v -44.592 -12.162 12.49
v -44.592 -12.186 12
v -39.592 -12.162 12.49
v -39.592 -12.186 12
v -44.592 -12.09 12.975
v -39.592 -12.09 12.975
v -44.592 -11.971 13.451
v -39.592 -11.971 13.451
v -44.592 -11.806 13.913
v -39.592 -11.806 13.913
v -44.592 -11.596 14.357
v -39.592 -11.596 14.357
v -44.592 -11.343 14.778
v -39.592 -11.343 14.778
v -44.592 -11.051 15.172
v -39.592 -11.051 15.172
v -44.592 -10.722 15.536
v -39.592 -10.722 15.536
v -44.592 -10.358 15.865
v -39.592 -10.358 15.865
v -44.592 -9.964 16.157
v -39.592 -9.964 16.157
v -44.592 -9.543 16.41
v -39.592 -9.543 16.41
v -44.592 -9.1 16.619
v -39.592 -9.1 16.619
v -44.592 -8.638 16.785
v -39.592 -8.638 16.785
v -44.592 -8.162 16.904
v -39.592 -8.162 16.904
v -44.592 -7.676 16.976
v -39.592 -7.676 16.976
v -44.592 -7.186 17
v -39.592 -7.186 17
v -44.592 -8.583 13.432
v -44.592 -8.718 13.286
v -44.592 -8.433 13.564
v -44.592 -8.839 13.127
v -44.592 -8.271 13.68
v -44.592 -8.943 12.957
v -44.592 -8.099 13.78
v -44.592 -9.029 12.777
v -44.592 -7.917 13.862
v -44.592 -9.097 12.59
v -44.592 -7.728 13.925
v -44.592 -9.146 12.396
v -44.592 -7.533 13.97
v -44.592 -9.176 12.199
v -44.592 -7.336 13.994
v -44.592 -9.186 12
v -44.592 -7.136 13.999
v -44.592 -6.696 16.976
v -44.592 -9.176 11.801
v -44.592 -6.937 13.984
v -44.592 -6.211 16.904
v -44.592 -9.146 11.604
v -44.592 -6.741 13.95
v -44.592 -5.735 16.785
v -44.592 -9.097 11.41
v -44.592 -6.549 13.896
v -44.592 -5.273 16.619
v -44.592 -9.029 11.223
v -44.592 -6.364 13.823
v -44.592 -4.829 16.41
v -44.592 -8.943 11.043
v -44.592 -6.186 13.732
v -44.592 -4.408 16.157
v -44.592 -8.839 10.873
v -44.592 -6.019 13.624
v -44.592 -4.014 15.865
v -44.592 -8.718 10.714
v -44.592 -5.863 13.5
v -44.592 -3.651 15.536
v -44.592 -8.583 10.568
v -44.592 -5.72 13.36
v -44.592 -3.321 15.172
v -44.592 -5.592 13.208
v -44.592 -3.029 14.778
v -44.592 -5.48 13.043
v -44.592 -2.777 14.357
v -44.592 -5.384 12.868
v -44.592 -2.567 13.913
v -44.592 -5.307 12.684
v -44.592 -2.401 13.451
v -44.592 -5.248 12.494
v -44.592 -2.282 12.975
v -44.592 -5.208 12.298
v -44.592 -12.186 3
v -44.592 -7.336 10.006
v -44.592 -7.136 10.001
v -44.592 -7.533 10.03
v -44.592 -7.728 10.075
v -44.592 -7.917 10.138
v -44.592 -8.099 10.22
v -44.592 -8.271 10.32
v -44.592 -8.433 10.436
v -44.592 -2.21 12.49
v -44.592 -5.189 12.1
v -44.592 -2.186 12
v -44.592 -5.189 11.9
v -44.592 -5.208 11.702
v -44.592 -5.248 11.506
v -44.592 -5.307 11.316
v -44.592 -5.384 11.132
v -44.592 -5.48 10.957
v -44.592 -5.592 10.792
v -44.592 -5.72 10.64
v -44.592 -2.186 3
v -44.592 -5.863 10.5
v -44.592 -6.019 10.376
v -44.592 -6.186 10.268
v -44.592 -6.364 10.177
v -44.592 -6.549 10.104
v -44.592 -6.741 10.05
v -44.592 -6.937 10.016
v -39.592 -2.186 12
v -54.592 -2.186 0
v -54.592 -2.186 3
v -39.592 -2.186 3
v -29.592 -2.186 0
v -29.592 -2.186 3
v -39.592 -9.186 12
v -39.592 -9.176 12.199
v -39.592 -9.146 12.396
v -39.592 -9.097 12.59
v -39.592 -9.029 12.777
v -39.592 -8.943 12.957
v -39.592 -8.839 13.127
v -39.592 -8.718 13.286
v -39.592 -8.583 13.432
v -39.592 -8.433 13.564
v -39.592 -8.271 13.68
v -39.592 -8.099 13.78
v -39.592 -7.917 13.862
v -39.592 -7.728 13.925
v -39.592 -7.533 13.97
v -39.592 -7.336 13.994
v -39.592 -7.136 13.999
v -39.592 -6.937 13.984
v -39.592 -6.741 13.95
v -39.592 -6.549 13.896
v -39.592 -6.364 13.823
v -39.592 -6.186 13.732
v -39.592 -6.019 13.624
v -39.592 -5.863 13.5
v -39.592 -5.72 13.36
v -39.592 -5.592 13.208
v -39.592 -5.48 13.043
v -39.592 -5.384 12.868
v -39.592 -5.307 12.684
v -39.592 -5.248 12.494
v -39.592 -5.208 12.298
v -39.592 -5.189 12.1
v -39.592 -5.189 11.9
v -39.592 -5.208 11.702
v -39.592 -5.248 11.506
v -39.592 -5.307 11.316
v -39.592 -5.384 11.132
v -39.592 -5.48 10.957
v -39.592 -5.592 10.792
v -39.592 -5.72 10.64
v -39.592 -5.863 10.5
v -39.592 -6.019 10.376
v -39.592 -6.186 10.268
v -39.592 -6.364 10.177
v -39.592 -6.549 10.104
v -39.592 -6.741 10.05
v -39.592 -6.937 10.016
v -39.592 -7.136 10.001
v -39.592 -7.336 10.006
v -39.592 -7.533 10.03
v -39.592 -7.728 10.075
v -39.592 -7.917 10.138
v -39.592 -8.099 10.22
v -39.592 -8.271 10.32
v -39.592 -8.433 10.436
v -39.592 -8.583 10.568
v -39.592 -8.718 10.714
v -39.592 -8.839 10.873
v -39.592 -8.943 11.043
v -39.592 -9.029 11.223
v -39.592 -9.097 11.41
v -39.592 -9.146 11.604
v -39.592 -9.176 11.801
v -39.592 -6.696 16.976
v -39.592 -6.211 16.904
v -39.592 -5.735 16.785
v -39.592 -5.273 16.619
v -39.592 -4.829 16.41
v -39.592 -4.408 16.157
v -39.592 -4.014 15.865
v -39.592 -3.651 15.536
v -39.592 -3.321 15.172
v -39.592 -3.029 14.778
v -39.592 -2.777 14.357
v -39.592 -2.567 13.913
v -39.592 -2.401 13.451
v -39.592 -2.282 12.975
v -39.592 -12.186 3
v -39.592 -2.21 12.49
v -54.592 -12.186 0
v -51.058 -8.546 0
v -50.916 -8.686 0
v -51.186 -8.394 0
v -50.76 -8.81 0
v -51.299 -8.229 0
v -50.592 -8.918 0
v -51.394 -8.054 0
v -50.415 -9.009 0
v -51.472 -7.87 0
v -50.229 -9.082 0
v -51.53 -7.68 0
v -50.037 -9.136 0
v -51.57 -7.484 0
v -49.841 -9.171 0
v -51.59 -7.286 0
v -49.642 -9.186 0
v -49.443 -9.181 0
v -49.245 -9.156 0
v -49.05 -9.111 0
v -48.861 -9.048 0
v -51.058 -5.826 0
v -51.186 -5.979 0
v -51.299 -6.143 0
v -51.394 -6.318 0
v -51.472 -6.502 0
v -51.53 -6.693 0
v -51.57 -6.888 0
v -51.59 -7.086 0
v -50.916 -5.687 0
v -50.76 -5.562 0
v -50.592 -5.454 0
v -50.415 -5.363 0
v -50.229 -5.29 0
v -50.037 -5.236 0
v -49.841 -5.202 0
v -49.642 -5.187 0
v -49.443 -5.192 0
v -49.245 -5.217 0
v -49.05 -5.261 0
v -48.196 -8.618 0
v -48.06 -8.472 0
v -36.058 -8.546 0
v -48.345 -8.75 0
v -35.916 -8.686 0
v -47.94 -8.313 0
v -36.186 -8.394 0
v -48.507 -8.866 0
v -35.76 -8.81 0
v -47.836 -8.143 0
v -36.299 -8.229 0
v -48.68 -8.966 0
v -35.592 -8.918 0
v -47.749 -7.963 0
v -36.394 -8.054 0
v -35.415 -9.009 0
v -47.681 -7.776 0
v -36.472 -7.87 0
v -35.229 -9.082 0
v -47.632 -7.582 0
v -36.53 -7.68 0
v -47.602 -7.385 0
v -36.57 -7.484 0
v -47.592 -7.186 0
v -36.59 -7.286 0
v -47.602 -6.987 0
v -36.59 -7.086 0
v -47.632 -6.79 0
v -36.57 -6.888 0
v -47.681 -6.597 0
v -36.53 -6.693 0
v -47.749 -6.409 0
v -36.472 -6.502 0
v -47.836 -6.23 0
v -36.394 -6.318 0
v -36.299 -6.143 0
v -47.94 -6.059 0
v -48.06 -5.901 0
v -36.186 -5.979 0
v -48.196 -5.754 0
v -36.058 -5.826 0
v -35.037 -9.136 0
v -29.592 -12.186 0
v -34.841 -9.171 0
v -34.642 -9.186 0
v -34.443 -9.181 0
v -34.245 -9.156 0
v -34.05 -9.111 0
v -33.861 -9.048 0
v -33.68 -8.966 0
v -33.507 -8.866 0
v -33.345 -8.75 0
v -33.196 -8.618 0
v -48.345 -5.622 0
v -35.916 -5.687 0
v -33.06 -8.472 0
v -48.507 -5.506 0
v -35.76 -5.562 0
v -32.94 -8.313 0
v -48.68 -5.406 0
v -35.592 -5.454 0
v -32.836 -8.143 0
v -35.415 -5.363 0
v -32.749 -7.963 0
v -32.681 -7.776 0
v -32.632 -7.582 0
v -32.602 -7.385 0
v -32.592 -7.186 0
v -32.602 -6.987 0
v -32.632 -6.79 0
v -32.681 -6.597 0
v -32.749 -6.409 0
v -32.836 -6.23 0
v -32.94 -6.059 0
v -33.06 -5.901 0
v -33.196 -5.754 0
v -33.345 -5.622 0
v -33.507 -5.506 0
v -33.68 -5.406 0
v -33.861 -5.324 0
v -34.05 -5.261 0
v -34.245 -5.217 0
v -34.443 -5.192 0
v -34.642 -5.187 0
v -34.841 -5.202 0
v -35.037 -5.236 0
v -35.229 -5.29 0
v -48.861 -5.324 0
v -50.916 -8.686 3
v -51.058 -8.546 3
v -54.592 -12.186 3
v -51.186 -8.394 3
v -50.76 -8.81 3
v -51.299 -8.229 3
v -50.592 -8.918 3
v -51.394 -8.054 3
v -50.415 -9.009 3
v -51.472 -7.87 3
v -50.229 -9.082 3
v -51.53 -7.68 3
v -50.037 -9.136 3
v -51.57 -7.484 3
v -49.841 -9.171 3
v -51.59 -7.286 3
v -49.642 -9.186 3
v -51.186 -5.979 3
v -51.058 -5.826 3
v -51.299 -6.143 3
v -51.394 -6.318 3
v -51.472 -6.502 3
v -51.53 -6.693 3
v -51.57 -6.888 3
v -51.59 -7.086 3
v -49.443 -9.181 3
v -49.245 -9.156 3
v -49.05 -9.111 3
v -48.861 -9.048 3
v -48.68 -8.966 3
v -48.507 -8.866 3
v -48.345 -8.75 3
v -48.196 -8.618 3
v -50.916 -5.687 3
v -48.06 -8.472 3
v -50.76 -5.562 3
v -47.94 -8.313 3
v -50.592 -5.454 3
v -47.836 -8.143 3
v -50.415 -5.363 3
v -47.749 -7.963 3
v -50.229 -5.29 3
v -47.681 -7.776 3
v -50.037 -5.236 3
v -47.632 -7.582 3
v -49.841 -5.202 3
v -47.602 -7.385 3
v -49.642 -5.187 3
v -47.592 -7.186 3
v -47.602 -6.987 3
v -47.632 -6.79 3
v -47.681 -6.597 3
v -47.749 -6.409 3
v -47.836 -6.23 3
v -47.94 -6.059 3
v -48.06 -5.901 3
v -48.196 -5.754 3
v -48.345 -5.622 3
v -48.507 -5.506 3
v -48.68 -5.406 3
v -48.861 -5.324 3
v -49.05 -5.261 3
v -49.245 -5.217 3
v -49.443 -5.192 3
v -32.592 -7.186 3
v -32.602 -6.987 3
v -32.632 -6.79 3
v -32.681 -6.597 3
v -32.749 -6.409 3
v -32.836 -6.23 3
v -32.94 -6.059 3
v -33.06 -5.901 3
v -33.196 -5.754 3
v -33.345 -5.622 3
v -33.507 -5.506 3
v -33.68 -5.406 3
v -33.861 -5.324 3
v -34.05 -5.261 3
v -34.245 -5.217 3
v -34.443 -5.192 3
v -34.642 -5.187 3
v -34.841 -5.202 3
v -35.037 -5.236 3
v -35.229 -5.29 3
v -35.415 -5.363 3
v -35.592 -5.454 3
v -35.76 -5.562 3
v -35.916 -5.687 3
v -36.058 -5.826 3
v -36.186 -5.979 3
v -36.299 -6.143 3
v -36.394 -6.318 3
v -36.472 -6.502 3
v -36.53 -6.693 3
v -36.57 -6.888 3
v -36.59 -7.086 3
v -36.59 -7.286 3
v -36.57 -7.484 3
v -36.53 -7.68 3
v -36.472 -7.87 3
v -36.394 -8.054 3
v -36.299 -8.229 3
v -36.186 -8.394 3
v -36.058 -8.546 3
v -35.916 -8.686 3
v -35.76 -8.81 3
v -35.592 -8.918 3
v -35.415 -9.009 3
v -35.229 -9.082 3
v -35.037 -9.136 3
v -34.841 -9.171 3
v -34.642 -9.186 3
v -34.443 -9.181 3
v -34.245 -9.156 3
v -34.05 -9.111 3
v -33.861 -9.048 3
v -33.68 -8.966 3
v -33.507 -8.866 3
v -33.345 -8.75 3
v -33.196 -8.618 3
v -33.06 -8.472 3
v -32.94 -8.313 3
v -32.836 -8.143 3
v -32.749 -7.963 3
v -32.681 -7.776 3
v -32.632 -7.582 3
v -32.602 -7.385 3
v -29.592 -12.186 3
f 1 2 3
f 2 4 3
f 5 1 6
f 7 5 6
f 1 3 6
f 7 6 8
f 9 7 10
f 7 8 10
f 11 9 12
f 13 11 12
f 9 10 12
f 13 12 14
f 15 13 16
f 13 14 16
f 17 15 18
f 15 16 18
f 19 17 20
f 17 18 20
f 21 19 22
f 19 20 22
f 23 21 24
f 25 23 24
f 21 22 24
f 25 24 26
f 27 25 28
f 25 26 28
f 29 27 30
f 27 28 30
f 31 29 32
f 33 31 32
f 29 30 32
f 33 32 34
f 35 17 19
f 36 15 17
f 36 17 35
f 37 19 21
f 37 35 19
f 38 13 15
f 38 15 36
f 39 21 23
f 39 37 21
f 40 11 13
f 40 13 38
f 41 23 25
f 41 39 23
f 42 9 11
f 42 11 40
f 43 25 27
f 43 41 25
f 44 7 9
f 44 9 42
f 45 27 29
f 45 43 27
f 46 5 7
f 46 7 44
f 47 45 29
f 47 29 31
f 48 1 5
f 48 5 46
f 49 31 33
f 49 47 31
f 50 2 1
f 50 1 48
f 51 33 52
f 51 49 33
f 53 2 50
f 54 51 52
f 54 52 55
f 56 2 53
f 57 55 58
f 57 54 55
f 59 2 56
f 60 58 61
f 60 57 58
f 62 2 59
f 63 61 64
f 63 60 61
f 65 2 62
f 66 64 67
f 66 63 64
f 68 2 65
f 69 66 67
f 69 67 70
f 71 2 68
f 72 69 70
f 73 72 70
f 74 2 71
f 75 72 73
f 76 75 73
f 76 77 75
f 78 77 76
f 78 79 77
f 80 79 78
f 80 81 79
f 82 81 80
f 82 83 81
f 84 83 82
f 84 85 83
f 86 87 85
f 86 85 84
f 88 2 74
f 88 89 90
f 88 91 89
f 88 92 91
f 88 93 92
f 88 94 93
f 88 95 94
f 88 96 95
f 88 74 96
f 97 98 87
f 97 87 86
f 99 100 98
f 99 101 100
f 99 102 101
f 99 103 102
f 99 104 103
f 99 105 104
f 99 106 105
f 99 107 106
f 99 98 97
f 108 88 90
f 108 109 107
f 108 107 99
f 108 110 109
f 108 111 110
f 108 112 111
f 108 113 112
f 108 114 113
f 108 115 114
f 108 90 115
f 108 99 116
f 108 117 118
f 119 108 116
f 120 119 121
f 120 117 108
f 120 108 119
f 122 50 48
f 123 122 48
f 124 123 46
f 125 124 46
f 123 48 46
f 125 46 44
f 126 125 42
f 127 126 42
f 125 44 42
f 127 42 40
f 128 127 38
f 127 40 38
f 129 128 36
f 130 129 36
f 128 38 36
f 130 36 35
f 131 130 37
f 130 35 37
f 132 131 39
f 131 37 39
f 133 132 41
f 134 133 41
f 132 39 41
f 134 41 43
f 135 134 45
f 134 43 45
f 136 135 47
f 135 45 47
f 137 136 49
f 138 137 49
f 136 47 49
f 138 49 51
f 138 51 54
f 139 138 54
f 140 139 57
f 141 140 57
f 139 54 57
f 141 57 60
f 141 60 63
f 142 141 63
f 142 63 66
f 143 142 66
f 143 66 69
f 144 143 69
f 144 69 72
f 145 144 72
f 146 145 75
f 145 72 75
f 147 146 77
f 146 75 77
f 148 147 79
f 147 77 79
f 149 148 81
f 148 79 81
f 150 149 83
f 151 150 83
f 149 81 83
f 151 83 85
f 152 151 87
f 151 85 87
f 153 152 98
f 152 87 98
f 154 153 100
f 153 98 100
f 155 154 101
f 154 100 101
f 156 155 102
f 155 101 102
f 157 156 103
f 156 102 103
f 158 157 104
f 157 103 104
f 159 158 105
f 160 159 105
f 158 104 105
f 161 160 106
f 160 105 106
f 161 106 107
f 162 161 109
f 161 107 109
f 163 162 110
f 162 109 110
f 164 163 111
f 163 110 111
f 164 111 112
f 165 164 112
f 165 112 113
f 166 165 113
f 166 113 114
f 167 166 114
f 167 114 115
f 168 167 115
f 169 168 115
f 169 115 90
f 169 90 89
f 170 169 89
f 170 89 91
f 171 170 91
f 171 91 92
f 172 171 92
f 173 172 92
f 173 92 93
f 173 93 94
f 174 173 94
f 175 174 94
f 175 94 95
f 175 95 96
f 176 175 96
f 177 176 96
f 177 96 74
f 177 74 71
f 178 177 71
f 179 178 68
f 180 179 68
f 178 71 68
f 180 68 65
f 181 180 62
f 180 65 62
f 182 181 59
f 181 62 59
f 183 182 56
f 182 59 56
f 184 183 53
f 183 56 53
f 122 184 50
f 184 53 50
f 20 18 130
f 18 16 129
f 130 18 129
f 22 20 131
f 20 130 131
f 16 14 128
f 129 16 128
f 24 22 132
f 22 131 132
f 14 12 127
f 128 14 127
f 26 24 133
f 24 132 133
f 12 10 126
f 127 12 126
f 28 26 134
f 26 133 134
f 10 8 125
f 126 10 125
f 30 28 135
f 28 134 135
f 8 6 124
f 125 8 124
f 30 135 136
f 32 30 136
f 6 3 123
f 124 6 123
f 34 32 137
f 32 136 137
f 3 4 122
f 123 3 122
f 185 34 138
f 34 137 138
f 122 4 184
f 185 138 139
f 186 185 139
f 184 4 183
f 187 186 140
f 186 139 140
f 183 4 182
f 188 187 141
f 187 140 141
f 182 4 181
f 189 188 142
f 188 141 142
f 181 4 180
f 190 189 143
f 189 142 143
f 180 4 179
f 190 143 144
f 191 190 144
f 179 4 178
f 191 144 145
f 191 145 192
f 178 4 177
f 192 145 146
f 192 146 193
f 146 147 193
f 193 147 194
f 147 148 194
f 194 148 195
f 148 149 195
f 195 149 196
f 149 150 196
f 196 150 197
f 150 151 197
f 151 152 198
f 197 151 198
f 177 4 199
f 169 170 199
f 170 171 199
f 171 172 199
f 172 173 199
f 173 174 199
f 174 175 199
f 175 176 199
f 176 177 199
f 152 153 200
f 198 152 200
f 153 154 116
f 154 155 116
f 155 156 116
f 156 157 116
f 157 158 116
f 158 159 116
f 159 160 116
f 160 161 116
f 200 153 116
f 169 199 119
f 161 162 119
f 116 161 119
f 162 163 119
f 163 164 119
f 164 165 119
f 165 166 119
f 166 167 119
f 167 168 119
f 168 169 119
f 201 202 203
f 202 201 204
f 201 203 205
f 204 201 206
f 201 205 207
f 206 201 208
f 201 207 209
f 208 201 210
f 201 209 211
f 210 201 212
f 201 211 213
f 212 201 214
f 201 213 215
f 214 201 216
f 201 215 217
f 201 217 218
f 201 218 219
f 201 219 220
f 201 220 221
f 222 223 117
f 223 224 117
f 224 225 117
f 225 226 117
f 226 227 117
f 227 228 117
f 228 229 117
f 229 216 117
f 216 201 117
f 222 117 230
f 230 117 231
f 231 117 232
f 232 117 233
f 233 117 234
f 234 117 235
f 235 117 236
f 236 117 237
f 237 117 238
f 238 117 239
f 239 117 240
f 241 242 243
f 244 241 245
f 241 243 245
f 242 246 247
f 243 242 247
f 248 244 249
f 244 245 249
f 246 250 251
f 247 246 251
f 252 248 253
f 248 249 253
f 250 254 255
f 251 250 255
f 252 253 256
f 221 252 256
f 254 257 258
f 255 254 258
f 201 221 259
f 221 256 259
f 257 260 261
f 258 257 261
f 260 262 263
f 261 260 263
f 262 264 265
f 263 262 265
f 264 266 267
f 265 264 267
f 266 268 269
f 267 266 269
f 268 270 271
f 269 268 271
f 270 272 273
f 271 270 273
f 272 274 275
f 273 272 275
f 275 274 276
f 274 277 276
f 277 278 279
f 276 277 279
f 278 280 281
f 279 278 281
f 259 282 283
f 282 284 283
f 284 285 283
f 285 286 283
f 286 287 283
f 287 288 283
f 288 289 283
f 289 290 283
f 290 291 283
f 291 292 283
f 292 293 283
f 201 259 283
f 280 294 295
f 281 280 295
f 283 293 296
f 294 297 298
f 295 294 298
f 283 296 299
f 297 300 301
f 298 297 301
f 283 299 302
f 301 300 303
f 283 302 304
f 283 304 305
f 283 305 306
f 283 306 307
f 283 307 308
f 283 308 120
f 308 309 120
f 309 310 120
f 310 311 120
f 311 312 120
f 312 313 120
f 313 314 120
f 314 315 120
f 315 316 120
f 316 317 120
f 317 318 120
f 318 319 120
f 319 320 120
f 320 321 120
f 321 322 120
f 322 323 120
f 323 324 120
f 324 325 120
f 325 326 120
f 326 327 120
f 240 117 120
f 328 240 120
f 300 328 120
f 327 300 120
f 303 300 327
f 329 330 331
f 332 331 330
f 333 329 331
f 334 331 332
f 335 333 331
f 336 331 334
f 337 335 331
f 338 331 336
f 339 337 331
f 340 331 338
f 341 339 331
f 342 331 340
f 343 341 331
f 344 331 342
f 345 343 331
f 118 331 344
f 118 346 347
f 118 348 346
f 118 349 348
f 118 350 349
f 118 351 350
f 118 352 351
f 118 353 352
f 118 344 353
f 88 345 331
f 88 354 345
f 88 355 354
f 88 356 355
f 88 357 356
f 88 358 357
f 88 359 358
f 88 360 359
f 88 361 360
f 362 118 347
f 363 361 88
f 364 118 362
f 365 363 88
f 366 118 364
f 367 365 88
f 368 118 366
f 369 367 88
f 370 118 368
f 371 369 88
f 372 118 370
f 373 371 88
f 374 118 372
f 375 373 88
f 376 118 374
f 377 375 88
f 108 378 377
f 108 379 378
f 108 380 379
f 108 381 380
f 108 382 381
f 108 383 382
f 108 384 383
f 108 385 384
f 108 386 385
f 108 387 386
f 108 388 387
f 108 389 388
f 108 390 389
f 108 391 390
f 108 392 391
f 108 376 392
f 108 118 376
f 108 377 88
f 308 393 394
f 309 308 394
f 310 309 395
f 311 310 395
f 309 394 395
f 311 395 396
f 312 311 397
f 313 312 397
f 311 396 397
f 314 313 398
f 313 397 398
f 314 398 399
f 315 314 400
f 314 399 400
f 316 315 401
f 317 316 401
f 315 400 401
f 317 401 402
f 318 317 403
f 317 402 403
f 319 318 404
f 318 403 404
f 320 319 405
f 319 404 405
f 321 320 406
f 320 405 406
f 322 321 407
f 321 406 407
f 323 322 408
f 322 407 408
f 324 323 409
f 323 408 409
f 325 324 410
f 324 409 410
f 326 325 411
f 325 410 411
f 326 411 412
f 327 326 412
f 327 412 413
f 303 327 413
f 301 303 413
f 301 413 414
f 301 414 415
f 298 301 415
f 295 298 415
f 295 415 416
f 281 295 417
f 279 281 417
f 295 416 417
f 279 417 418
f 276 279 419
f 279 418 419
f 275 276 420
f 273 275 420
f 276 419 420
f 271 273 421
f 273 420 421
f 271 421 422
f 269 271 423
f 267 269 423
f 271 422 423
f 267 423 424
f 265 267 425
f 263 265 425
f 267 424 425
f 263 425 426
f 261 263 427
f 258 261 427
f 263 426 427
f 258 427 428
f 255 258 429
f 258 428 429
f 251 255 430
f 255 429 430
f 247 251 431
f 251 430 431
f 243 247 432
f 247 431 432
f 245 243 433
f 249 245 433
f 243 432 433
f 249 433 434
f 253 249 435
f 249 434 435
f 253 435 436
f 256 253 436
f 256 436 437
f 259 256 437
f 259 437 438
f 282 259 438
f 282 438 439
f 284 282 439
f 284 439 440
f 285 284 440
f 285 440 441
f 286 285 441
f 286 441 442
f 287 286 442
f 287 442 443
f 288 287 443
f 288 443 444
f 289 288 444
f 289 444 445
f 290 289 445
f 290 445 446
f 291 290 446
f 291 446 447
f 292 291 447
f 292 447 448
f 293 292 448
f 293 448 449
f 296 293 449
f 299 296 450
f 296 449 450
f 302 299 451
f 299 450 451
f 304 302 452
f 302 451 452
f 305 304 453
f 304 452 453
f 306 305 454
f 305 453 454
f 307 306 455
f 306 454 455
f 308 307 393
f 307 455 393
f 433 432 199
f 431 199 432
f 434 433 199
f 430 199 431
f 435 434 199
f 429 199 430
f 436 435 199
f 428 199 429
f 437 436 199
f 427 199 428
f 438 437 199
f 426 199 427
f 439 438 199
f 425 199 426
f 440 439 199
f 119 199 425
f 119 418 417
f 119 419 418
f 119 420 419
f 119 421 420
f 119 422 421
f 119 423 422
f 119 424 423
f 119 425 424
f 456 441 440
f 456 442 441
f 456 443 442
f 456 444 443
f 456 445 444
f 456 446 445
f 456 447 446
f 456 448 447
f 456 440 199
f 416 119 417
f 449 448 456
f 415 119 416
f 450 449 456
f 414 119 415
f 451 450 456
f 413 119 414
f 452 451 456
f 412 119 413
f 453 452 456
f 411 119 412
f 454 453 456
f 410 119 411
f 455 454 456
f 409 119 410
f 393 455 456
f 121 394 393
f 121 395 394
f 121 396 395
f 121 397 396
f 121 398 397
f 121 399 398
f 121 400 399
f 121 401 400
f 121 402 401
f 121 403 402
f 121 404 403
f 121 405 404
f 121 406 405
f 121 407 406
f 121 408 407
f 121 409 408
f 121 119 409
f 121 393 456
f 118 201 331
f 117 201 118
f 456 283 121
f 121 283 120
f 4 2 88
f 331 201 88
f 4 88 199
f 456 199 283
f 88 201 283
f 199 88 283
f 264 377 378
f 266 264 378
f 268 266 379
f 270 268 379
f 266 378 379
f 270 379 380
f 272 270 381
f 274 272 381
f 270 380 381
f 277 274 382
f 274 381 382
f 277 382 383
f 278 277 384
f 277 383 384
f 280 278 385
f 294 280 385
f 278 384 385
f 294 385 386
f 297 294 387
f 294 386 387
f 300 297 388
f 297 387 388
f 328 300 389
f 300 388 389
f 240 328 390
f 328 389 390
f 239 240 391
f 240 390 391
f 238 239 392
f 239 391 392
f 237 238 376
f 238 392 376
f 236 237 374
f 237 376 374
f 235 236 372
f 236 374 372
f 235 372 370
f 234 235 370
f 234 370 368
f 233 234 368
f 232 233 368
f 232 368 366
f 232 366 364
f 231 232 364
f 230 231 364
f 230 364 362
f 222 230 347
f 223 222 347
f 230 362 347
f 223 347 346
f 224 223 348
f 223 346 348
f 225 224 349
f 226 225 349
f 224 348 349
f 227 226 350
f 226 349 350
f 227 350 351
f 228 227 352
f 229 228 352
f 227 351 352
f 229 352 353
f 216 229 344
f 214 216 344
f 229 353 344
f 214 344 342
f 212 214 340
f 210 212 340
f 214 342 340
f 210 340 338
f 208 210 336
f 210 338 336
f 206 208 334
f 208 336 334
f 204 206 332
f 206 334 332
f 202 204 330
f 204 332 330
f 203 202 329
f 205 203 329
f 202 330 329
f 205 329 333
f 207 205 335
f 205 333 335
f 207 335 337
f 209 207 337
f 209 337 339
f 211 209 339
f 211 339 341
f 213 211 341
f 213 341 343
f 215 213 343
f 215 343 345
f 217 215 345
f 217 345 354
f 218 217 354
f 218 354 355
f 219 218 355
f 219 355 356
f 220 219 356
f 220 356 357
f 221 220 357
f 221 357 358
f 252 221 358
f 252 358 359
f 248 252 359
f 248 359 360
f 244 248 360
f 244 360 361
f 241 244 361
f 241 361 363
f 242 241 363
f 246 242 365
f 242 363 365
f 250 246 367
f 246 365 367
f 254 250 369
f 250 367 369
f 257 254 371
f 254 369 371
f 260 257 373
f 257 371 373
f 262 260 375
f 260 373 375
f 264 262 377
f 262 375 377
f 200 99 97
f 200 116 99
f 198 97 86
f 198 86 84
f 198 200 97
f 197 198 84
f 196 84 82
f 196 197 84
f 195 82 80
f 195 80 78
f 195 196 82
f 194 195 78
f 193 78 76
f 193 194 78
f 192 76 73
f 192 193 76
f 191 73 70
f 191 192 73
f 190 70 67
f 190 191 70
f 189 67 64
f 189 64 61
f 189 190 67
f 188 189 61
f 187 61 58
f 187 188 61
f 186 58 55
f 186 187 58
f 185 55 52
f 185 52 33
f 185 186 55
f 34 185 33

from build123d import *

# Parameters (mm, degrees)
F0_W     = 25
F0_H     = 10
F1_DEPTH = 3
F2_W     = 5
F2_H     = 10
F3_DEPTH = 14
F5_R     = 4.99999
F4_R     = 2
F7_DEPTH = 3
F6_R     = 2
F8_DEPTH = 5


# Not quite as in the source:
# - a fillet or chamfer is up to 0.001 mm smaller than in the source, because OpenCascade refuses the exact size


with BuildPart() as f1:
    # F0 (on Top) → F1 (new body)
    with BuildSketch(Plane.XY):
        with Locations((-42.0921362936, -7.1861277148)):
            Rectangle(F0_W, F0_H)
    extrude(amount=F1_DEPTH)

    # F2 (on face) → F3 (join)
    with BuildSketch(Plane.XY.offset(3)):
        with Locations((-42.0921362936, -7.1861277148)):
            Rectangle(F2_W, F2_H)
    extrude(amount=F3_DEPTH)

    # F5 (radius 5 in the source; OpenCascade refuses exactly that, so slightly less here)
    f5_edges = [f1.edges().sort_by_distance(p)[0] for p in [
        (-42.092136, -12.186128, 17),
        (-42.092136, -2.186128, 17),
    ]]
    fillet(f5_edges, radius=F5_R)

    # F4 (on face) → F7 (cut)
    with BuildSketch(Plane.XY.offset(3)):
        with Locations((-49.5921362936, -7.1861277148)):
            Circle(F4_R)
        with Locations((-34.5921362936, -7.1861277148)):
            Circle(F4_R)
    extrude(amount=-F7_DEPTH, mode=Mode.SUBTRACT)

    # F6 (on face) → F8 (cut)
    with BuildSketch(Plane(origin=(-44.5921362936, 0, 0), x_dir=(0, -1, 0), z_dir=(-1, 0, 0))):
        with Locations((7.1861277148, 12)):
            Circle(F6_R)
    extrude(amount=-F8_DEPTH, mode=Mode.SUBTRACT)


solid = f1.part
